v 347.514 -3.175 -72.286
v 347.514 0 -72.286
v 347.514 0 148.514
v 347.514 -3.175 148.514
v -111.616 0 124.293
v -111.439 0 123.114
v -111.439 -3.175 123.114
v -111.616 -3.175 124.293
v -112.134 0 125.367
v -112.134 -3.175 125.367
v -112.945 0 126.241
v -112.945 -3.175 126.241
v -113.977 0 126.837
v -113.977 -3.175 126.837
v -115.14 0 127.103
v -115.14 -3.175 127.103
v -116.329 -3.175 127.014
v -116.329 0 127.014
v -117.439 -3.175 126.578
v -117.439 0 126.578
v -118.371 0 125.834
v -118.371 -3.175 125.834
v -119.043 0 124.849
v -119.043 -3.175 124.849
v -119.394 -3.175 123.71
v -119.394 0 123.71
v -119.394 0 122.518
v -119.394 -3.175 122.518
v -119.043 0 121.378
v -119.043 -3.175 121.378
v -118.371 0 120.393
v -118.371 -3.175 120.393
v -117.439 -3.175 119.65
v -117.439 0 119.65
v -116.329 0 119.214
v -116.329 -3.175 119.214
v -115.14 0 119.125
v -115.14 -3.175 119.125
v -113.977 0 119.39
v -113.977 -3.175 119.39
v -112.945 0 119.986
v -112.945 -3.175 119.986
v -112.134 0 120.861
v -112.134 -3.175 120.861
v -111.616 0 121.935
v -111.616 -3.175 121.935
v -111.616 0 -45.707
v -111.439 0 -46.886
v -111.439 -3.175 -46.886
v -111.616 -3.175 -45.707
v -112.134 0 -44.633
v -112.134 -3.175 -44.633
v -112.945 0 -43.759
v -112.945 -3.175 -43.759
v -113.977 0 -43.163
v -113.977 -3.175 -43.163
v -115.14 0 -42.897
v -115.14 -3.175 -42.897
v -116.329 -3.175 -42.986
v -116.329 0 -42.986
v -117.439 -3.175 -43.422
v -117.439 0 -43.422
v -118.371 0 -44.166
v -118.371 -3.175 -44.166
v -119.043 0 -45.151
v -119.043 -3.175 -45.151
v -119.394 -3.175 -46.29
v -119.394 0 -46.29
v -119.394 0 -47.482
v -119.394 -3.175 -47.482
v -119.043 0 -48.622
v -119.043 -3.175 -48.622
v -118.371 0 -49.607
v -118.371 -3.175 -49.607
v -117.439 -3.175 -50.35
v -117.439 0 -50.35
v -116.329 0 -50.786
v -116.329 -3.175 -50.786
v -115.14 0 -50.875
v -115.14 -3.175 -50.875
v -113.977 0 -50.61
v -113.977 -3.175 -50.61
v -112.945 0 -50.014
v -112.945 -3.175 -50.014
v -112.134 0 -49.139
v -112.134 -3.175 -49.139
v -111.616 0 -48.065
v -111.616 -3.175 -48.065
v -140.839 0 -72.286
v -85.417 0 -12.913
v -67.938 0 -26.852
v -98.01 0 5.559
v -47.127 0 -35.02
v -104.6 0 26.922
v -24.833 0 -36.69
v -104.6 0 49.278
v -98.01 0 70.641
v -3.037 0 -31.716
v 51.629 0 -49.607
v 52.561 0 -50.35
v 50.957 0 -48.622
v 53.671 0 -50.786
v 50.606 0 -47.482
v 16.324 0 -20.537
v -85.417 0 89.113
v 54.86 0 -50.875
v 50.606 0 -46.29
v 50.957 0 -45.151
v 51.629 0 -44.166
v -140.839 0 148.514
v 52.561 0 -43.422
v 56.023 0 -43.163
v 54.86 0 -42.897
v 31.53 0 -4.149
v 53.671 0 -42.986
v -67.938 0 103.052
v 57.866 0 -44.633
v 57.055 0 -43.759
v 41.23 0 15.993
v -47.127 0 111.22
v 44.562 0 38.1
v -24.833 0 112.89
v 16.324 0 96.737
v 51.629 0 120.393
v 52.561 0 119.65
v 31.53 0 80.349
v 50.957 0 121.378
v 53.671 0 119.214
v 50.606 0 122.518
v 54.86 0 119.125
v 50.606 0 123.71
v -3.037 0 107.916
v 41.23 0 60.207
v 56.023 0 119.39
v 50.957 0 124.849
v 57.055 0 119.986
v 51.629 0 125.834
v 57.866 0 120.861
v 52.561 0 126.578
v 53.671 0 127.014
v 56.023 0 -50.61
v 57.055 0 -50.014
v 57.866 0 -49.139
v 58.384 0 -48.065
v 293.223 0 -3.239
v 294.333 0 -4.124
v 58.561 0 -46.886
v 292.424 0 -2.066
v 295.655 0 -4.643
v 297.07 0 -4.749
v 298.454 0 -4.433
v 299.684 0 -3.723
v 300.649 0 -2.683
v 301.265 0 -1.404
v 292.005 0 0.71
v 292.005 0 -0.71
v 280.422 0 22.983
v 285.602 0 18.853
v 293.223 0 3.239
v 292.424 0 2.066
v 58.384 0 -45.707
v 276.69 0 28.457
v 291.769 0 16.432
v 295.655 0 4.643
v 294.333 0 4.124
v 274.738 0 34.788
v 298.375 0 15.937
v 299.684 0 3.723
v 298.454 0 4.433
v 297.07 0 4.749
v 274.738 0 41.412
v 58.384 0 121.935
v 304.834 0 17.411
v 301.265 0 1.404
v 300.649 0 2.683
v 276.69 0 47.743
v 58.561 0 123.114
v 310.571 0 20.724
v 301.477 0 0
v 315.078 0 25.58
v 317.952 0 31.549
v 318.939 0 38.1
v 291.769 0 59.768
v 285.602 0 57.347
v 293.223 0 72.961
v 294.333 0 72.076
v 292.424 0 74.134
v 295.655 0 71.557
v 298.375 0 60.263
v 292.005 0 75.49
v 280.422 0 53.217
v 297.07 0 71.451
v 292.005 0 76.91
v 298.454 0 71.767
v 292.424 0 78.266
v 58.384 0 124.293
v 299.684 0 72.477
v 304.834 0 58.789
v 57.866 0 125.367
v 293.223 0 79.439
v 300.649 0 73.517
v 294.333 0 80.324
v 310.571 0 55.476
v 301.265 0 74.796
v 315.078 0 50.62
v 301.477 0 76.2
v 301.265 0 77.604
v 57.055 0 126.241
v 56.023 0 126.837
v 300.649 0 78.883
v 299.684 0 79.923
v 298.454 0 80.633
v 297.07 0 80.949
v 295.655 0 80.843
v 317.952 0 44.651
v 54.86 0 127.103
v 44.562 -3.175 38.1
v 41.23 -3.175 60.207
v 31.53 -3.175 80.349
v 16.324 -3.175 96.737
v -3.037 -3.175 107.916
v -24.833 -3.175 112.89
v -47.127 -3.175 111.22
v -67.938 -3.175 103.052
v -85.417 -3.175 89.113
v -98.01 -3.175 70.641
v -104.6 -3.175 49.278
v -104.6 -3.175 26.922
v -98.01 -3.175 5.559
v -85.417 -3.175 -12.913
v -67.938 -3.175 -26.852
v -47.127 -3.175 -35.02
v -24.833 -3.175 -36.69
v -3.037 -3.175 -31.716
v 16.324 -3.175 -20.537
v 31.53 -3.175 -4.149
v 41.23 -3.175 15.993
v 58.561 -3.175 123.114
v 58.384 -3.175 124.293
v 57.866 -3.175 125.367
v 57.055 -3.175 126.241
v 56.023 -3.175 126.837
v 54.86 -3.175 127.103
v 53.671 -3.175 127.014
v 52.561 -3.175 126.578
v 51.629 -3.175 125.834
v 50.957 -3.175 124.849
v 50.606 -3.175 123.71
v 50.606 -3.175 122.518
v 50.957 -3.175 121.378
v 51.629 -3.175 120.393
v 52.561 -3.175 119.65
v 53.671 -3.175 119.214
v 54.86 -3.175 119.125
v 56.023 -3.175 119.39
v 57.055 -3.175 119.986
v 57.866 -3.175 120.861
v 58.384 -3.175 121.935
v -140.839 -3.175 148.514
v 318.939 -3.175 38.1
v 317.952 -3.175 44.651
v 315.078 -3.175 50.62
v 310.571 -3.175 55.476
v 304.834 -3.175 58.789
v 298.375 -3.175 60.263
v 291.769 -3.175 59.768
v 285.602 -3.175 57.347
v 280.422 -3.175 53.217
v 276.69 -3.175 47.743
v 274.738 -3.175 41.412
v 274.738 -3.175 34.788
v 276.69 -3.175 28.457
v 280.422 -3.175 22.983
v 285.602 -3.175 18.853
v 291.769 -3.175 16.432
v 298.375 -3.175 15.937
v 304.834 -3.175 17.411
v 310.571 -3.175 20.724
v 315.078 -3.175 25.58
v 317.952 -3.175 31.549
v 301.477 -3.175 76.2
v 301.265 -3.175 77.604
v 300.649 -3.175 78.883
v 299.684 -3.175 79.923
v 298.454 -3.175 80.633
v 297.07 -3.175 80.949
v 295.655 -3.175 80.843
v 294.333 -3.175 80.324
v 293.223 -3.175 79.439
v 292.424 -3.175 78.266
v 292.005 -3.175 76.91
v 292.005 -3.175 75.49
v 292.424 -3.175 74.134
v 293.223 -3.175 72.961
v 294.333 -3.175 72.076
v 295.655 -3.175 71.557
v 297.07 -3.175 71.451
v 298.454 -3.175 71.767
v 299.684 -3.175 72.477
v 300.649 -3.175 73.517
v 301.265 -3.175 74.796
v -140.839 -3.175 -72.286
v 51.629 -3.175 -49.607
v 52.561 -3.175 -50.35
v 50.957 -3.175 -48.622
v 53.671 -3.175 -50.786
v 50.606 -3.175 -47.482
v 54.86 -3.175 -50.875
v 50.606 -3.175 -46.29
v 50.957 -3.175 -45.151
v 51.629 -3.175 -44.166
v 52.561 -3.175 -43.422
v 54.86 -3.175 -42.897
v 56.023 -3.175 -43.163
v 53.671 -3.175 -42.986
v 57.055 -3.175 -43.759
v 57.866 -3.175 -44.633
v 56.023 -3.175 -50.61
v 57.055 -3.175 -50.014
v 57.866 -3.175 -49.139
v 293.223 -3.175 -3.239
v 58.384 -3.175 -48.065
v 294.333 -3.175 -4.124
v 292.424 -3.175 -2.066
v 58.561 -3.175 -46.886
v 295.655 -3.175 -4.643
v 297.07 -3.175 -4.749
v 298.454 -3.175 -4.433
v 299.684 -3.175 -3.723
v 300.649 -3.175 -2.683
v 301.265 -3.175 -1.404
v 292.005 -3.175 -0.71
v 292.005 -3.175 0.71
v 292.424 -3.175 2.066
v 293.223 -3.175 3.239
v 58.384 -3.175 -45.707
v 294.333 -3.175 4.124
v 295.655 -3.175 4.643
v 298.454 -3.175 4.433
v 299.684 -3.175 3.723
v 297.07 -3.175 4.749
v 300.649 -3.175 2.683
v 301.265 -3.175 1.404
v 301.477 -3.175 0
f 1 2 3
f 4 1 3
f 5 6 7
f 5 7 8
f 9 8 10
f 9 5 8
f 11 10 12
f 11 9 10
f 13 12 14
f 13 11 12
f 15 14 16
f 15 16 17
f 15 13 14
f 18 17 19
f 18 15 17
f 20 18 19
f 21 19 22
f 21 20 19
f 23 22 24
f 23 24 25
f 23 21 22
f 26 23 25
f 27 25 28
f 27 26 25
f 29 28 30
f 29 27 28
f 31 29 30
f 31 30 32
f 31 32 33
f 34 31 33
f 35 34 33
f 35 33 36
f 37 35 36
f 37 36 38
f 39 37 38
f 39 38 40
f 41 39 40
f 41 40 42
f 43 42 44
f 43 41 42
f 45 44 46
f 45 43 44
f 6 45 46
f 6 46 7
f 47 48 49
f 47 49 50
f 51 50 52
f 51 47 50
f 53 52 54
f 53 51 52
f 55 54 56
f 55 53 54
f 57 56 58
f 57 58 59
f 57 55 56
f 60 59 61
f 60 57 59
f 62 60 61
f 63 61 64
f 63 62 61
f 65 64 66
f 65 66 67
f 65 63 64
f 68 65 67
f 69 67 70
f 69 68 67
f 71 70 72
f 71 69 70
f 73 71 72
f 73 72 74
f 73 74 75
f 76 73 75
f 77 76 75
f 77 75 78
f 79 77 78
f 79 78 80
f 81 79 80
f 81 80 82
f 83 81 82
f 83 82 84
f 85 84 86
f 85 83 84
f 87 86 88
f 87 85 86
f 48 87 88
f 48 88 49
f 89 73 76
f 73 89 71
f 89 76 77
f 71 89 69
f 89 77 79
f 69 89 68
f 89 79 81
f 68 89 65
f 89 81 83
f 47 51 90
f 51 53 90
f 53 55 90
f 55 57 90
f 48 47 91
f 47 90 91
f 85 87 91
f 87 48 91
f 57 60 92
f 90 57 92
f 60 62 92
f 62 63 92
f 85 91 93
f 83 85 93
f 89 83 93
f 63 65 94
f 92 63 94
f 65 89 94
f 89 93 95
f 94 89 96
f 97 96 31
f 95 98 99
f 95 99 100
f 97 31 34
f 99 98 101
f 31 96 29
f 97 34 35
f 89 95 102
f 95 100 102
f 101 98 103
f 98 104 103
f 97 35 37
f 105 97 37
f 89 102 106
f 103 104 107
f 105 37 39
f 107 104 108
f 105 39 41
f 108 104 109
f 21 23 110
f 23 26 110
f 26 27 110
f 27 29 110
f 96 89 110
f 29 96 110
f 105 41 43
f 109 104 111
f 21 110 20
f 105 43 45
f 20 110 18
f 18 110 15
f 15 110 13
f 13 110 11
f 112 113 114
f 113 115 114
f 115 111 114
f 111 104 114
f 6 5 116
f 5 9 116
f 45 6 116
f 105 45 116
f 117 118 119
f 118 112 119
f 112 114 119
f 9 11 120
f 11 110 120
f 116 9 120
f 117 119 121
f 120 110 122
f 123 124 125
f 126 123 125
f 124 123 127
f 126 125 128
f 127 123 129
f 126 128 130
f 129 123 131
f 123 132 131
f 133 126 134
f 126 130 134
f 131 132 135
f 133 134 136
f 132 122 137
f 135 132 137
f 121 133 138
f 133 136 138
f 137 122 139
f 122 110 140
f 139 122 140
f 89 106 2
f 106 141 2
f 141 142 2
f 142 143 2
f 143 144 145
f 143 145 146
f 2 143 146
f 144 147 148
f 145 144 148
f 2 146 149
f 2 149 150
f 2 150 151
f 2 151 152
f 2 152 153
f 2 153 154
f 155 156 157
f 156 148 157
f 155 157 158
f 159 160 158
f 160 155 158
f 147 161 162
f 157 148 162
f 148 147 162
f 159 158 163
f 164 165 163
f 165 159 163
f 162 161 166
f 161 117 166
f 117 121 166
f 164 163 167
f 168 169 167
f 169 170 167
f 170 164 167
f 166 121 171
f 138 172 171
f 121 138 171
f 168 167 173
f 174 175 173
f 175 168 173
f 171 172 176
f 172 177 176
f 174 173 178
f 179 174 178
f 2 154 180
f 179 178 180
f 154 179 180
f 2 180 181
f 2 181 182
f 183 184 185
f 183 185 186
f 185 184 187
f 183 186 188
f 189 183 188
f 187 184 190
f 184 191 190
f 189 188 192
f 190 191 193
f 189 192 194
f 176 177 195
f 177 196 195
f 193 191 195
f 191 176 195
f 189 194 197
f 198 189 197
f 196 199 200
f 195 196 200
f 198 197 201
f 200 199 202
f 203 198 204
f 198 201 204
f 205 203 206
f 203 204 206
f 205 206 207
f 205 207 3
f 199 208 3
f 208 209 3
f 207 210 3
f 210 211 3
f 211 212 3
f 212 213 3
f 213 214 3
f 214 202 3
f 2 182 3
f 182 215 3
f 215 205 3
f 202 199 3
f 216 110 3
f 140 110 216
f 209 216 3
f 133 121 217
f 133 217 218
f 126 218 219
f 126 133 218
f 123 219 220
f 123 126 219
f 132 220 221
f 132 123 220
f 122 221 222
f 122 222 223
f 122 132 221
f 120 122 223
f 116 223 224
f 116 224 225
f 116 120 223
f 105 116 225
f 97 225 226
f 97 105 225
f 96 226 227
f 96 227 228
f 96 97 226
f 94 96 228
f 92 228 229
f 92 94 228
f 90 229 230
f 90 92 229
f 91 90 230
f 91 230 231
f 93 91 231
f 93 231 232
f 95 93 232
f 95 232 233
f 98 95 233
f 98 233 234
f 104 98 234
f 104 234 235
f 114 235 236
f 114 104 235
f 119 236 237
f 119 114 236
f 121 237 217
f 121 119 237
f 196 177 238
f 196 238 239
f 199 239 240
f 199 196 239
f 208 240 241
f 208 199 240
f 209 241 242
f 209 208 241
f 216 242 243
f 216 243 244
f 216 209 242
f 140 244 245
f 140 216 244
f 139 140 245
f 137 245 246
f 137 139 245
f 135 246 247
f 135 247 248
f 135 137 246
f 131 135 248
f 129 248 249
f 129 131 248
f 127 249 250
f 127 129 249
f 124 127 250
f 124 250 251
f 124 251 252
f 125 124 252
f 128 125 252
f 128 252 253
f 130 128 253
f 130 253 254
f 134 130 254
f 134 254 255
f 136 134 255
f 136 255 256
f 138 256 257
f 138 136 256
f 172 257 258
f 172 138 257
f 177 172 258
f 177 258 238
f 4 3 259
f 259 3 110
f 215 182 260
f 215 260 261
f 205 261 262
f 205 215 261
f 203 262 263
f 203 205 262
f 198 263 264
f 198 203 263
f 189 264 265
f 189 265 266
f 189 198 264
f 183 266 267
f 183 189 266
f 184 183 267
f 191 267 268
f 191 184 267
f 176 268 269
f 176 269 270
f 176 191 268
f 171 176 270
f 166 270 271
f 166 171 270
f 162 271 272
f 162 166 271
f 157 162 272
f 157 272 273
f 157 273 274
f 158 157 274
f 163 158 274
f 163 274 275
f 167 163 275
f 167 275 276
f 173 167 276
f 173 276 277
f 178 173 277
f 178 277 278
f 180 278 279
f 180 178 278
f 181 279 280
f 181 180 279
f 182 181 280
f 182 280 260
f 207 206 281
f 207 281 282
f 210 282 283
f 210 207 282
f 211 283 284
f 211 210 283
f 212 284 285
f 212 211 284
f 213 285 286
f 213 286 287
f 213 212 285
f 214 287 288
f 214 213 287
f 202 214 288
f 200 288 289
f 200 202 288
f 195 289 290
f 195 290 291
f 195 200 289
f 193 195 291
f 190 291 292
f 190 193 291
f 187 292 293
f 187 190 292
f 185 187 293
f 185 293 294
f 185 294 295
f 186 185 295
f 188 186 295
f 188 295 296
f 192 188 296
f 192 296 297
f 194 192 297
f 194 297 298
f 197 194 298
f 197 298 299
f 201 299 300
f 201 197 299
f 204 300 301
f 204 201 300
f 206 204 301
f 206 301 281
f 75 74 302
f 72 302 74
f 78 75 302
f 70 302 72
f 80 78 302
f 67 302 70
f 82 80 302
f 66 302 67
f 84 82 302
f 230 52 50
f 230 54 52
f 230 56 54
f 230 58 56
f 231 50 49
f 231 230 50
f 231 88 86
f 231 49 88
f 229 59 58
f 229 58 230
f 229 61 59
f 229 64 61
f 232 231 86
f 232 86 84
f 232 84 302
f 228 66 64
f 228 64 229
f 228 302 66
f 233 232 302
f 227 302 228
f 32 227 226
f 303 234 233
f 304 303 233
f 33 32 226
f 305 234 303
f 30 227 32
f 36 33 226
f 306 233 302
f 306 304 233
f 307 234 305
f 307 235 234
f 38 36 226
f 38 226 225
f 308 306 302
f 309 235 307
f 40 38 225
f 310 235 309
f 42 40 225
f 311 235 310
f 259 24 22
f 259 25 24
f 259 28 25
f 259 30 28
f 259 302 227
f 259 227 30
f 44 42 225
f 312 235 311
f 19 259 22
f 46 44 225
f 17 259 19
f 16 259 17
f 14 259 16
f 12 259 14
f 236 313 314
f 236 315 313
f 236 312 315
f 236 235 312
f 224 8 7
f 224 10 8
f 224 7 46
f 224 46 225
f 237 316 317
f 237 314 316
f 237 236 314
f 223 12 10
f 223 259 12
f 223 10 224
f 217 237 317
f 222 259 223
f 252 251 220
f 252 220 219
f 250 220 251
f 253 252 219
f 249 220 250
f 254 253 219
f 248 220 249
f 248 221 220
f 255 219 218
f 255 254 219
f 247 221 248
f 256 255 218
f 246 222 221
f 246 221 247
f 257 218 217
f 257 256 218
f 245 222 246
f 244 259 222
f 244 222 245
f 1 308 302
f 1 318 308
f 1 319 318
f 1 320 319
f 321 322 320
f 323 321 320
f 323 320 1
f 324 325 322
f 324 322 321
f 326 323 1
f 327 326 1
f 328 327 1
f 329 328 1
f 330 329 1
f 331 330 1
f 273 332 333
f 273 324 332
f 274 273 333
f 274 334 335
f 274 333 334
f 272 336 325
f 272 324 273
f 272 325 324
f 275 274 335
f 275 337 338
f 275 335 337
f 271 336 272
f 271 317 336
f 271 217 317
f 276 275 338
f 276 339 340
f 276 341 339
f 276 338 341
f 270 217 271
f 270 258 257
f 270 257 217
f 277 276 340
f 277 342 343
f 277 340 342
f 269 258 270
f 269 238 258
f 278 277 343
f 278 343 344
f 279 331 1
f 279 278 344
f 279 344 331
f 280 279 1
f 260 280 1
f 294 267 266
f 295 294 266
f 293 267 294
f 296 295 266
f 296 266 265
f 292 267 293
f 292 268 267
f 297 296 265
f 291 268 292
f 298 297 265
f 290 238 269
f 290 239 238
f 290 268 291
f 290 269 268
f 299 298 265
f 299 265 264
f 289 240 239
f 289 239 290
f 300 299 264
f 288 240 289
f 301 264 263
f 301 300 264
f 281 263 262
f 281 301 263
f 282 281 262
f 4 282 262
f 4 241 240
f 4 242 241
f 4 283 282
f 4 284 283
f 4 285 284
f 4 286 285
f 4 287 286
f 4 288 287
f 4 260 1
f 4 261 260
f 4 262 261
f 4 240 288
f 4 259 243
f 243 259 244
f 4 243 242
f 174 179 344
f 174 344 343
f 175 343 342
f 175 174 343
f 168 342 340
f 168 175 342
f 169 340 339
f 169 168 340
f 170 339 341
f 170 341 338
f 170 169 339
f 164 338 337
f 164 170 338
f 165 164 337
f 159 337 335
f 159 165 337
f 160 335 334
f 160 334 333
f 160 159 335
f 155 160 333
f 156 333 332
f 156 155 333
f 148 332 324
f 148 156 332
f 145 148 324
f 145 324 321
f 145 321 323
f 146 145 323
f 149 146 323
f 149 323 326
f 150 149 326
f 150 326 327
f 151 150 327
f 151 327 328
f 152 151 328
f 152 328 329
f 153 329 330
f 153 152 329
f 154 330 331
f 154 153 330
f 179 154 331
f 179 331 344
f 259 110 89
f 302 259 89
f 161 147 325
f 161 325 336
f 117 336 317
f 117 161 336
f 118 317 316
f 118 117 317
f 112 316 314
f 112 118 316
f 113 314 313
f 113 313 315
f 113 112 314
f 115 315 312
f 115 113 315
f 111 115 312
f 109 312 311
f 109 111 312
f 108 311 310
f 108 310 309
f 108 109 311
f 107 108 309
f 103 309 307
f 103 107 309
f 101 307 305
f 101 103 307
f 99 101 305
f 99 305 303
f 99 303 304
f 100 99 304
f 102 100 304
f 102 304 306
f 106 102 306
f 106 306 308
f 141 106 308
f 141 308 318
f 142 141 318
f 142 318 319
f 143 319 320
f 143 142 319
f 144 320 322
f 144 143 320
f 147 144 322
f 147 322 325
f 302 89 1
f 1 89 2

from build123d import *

# Parameters (mm, degrees)
F0_R     = 4
F0_R_2   = 75
F0_R_3   = 4.7625
F0_R_4   = 22.225
F1_DEPTH = 3.175


with BuildPart() as f1:
    # F0 (on Front) → F1 (new body)
    with BuildSketch(Plane.XZ):
        Polygon((-140.838728, 148.5138), (-140.838728, -72.2862), (347.514372, -72.2862), (347.514372, 38.1), (347.514372, 148.5138), align=None)
        with Locations((-115.438728, -46.8862)):
            Circle(F0_R, mode=Mode.SUBTRACT)
        with Locations((54.561272, -46.8862)):
            Circle(F0_R, mode=Mode.SUBTRACT)
        with Locations((-30.437628, 38.1)):
            Circle(F0_R_2, mode=Mode.SUBTRACT)
        with Locations((296.714372, 0)):
            Circle(F0_R_3, mode=Mode.SUBTRACT)
        with Locations((296.714372, 38.1)):
            Circle(F0_R_4, mode=Mode.SUBTRACT)
        with Locations((-115.438728, 123.1138)):
            Circle(F0_R, mode=Mode.SUBTRACT)
        with Locations((54.561272, 123.1138)):
            Circle(F0_R, mode=Mode.SUBTRACT)
        with Locations((296.714372, 76.2)):
            Circle(F0_R_3, mode=Mode.SUBTRACT)
    extrude(amount=F1_DEPTH)


solid = f1.part
